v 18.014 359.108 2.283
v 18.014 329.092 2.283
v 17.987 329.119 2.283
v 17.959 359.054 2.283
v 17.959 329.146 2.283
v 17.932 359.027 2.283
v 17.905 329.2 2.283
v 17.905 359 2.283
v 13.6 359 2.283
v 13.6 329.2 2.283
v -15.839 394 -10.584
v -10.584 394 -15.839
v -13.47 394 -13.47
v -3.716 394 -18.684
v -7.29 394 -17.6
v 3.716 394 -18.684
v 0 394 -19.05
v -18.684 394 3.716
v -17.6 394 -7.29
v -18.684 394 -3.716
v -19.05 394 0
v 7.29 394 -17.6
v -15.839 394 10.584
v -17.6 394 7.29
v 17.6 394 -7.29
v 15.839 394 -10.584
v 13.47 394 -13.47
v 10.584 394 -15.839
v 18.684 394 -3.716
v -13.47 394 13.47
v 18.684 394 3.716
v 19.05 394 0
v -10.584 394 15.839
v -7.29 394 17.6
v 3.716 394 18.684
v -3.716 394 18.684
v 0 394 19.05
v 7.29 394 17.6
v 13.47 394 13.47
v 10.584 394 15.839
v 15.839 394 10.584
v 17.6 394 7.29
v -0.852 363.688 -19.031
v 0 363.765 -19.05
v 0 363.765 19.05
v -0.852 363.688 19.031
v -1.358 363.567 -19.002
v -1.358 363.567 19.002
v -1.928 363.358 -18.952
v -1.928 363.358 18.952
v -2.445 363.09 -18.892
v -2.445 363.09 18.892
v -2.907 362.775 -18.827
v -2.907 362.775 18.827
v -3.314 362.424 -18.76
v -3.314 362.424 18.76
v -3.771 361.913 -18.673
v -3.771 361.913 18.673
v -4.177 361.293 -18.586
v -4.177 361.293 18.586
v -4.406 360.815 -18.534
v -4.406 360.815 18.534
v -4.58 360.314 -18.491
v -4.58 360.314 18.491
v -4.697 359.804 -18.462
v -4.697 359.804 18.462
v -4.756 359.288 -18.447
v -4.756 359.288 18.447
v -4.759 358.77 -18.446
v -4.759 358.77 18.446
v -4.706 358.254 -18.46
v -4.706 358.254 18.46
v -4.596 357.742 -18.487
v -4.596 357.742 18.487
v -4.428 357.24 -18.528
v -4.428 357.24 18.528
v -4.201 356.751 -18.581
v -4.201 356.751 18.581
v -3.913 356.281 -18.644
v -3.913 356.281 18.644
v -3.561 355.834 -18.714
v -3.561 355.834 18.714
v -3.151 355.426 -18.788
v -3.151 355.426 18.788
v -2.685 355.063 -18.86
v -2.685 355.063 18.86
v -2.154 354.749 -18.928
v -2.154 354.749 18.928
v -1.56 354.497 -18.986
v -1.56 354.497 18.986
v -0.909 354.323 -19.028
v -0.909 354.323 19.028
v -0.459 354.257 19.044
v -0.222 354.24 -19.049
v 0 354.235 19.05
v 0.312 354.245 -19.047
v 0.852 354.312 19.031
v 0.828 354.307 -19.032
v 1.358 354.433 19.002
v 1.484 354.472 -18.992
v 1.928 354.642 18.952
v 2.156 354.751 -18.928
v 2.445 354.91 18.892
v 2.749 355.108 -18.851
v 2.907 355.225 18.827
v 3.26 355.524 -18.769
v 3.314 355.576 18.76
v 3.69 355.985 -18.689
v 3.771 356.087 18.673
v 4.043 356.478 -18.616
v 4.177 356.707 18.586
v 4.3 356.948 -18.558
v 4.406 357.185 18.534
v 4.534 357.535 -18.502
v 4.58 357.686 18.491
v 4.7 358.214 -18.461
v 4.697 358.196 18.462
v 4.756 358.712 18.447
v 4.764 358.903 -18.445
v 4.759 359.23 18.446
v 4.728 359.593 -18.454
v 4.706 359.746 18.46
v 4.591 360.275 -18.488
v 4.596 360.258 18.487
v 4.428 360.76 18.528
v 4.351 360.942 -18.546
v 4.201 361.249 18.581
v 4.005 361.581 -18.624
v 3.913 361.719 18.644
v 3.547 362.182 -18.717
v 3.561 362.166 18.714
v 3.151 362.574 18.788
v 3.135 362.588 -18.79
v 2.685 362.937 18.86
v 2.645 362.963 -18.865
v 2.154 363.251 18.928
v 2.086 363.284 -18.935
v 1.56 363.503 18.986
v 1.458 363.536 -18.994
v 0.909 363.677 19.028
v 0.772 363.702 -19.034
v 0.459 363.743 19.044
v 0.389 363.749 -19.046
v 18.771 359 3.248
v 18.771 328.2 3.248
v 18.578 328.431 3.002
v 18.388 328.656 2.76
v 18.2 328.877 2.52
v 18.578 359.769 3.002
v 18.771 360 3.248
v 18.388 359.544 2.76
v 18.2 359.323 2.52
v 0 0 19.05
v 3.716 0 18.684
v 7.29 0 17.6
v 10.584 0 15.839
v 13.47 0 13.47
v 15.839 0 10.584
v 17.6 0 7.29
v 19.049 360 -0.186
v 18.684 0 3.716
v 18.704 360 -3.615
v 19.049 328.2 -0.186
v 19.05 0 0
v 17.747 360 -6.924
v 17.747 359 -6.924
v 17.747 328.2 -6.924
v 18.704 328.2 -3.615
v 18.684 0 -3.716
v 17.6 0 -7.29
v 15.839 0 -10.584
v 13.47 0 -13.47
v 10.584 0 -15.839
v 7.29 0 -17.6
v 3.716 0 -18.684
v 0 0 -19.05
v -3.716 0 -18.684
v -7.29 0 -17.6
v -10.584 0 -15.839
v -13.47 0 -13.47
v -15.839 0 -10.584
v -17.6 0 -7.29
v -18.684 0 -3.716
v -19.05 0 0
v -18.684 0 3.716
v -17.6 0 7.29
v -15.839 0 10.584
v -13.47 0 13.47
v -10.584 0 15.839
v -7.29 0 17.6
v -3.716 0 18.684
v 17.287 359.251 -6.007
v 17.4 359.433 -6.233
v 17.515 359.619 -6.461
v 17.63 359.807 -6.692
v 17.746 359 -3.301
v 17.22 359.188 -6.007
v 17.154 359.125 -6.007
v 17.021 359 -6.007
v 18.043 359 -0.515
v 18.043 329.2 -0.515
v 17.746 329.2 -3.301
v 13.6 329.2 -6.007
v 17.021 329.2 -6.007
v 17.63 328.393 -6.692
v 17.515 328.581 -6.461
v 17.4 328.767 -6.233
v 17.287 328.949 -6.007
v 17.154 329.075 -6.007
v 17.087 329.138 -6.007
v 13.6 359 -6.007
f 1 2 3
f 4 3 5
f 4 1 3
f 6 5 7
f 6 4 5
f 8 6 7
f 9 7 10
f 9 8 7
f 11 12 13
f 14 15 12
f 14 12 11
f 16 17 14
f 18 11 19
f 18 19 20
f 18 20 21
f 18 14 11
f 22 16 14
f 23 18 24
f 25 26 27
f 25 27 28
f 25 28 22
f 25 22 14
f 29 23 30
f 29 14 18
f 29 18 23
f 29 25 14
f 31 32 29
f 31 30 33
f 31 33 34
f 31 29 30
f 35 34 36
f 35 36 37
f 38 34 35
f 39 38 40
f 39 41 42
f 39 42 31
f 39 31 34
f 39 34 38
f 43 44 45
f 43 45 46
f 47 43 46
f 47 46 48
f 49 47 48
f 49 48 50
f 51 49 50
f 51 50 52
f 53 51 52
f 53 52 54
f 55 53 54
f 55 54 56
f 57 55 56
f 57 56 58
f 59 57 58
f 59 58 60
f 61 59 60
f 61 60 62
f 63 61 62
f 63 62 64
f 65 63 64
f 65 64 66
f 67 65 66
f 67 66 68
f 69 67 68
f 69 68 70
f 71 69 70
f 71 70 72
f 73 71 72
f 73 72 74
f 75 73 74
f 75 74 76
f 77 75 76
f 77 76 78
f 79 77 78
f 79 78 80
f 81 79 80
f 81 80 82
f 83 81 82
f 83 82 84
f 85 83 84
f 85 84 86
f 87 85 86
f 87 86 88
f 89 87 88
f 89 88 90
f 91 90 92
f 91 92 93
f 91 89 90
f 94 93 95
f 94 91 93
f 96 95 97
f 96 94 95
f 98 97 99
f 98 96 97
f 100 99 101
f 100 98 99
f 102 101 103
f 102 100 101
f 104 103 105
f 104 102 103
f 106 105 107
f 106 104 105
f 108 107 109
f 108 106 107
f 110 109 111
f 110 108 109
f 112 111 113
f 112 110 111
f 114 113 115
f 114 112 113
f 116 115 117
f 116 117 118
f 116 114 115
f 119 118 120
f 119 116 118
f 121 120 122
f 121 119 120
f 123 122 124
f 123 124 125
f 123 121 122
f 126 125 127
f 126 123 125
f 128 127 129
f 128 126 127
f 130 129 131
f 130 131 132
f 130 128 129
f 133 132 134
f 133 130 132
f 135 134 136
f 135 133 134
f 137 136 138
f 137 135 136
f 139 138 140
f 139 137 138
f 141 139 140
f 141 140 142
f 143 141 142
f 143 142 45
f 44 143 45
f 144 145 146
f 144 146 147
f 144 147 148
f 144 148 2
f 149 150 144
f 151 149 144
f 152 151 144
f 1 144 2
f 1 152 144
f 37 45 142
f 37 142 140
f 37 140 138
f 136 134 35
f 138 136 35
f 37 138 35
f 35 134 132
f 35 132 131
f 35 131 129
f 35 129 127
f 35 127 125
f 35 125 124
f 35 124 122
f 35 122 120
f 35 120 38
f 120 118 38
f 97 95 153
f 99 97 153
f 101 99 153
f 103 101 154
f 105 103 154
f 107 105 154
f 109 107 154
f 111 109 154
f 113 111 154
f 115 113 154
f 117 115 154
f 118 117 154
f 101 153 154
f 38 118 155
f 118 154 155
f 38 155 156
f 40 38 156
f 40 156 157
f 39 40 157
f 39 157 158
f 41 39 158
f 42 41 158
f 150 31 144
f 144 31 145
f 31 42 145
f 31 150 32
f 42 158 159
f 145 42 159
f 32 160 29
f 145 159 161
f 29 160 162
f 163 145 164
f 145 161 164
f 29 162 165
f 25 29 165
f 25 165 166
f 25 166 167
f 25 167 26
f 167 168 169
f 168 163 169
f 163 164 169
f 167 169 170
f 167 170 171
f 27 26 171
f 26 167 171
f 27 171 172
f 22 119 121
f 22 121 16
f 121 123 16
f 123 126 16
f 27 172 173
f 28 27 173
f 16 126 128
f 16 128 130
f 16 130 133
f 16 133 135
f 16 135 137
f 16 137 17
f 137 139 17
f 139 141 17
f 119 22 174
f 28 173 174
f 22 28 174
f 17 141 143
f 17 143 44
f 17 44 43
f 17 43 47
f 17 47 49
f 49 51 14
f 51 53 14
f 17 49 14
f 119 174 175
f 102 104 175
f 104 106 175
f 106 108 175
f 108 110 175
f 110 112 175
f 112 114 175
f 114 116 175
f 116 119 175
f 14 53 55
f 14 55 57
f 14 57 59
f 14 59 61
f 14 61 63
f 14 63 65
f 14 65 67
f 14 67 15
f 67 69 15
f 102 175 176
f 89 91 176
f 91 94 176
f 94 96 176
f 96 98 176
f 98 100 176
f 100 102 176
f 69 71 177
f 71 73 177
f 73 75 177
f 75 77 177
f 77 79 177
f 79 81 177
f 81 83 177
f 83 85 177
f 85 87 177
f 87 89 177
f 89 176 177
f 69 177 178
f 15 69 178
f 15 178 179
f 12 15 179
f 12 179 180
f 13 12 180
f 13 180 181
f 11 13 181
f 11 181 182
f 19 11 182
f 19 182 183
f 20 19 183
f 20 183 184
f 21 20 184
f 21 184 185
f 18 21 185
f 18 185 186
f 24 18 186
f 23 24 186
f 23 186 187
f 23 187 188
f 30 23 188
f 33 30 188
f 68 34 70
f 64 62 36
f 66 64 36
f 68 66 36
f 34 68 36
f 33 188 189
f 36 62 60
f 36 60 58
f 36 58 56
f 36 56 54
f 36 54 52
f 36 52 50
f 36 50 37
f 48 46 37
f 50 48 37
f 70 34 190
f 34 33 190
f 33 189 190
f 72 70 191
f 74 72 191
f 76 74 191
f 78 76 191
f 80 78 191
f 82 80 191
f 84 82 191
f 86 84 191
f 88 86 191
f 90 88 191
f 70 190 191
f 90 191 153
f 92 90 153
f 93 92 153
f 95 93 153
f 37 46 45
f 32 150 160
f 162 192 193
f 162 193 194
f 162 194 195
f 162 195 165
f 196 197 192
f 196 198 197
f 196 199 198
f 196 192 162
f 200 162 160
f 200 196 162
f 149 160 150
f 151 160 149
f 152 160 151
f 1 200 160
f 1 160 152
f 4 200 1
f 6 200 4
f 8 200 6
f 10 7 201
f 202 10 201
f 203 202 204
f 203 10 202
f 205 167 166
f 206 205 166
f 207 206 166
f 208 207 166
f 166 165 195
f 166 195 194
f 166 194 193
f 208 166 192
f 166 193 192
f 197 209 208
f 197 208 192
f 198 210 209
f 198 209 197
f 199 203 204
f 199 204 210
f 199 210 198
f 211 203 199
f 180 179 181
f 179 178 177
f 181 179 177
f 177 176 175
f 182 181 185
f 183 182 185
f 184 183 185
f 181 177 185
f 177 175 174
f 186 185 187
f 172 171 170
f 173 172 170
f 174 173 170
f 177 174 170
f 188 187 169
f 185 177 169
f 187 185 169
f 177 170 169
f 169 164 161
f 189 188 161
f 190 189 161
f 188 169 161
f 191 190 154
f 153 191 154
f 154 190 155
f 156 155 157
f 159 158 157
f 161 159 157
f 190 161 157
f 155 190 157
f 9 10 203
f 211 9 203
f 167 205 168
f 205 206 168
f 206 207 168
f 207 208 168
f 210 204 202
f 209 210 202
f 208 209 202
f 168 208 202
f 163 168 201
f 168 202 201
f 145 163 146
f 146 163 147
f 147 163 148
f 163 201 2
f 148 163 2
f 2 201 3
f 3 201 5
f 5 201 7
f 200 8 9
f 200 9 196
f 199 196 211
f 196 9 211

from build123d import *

# Parameters (mm, degrees)
CROQUIS1_R                 = 19.05
SALIENTE_EXTRUIR1_DEPTH    = 394
CORTAR_EXTRUIR1_DEPTH      = 395.919998227
CORTAR_EXTRUIR1_DEPTH_BACK = 395.919998227
CROQUIS2_R                 = 4.765
CORTAR_EXTRUIR2_DEPTH      = 397.295991136
CORTAR_EXTRUIR2_DEPTH_BACK = 5.45
CROQUIS4_W                 = 8.29
CROQUIS4_H                 = 29.8
CHAFL_N1_SIZE              = 1
CHAFL_N1_SIZE_2            = 0.898769363
CHAFL_N1_SIZE_3            = 0.790943361


with BuildPart() as part:
    # Croquis1 → Saliente-Extruir1 (new body)
    with BuildSketch(Plane(origin=(0, 0, 0), x_dir=(1, 0, 0), z_dir=(0, 1, 0))):
        with Locations(Location((0, 0, 0), (0, 0, 270))):
            Circle(CROQUIS1_R)
    extrude(amount=SALIENTE_EXTRUIR1_DEPTH)

    # Croquis2 → Cortar-Extruir1 (cut, two sides: drawn at the far end of the back side and taken through both)
    with BuildSketch(Plane.XY.offset(-CORTAR_EXTRUIR1_DEPTH_BACK)):
        with Locations(Location((0, 359, 0), (0, 0, 90.000000003))):
            Circle(CROQUIS2_R)
    extrude(amount=CORTAR_EXTRUIR1_DEPTH + CORTAR_EXTRUIR1_DEPTH_BACK, mode=Mode.SUBTRACT)

    # Croquis4 → Cortar-Extruir2 (cut, two sides: drawn at the far end of the back side and taken through both)
    with BuildSketch(Plane(origin=(19.05, 0, 0), x_dir=(0, 0, -1), z_dir=(1, 0, 0)).offset(-CORTAR_EXTRUIR2_DEPTH_BACK)):
        with Locations((1.862063648, 344.1)):
            Rectangle(CROQUIS4_W, CROQUIS4_H)
    extrude(amount=CORTAR_EXTRUIR2_DEPTH + CORTAR_EXTRUIR2_DEPTH_BACK, mode=Mode.SUBTRACT)

    # Chaflán1
    # the kernel refuses this chamfer: 1, 0.898769363, 0.790943361 mm, written as the material it takes off along each edge
    with BuildSketch(Plane(origin=(0, 329.2, 0), x_dir=(0.8979062520865971, 0, -0.4401867359017083), z_dir=(-0.4401867359017083, 0, -0.8979062520865971))) as chafl_n1_piece_1_section:
        Polygon((19.05, CHAFL_N1_SIZE), (19.05 - CHAFL_N1_SIZE, 0), (19.05, 0), align=None)
    chafl_n1_piece_1 = revolve(axis=Axis((0, 329.2, 0), (0, -1, 0)), revolution_arc=40.733590892, mode=Mode.PRIVATE)
    chafl_n1_piece_1 = split(chafl_n1_piece_1, bisect_by=Plane(origin=(0, 329.2, 2.282936352), z_dir=(0, 0, -1)), keep=Keep.TOP, mode=Mode.PRIVATE)
    chafl_n1_piece_1 = split(chafl_n1_piece_1, bisect_by=Plane(origin=(0, 329.2, -6.007063648), z_dir=(0, 0, 1)), keep=Keep.TOP, mode=Mode.PRIVATE)
    add(chafl_n1_piece_1, mode=Mode.SUBTRACT)
    with BuildSketch(Plane(origin=(0, 359, 0), x_dir=(0.8979062520865971, 0, -0.4401867359017083), z_dir=(-0.4401867359017083, 0, -0.8979062520865971))) as chafl_n1_piece_2_section:
        Polygon((19.05, -CHAFL_N1_SIZE), (19.05 - CHAFL_N1_SIZE, 0), (19.05, 0), align=None)
    chafl_n1_piece_2 = revolve(axis=Axis((0, 359, 0), (0, -1, 0)), revolution_arc=40.733590892, mode=Mode.PRIVATE)
    chafl_n1_piece_2 = split(chafl_n1_piece_2, bisect_by=Plane(origin=(0, 359, 2.282936352), z_dir=(0, 0, -1)), keep=Keep.TOP, mode=Mode.PRIVATE)
    chafl_n1_piece_2 = split(chafl_n1_piece_2, bisect_by=Plane(origin=(0, 359, -6.007063648), z_dir=(0, 0, 1)), keep=Keep.TOP, mode=Mode.PRIVATE)
    add(chafl_n1_piece_2, mode=Mode.SUBTRACT)
    with BuildSketch(Plane(origin=(18.912712698, 359, 2.282936352), x_dir=(-0.1452151757871569, 0, 0.9894000973929127), z_dir=(0, -1, 0))) as chafl_n1_piece_3:
        with BuildLine():
            Line((0.975350899, 0), (CHAFL_N1_SIZE_2 * 0.14521517582, CHAFL_N1_SIZE_2 * 0.989400097614))
            Line((CHAFL_N1_SIZE_2 * 0.14521517582, CHAFL_N1_SIZE_2 * 0.989400097614), (0, 0))
            ThreePointArc((0, 0), (0.501444944, -0.006238234), (0.975350899, 0))
        make_face()
    extrude(amount=29.8, mode=Mode.SUBTRACT)
    with BuildSketch(Plane(origin=(18.078099633, 359, -6.007063648), x_dir=(-0.33952178475198846, 0, -0.9405981914073748), z_dir=(0, -1, 0))) as chafl_n1_piece_4:
        with BuildLine():
            Line((0.975350899, 0), (CHAFL_N1_SIZE_3 * 0.339521784837, -CHAFL_N1_SIZE_3 * 0.940598191643))
            Line((CHAFL_N1_SIZE_3 * 0.339521784837, -CHAFL_N1_SIZE_3 * 0.940598191643), (0, 0))
            ThreePointArc((0, 0), (0.501444944, 0.006238234), (0.975350899, 0))
        make_face()
    extrude(amount=29.8, mode=Mode.SUBTRACT)
    with BuildSketch(Plane(origin=(0, 329.2, 0), x_dir=(0.8979062520865971, 0, -0.4401867359017083), z_dir=(-0.4401867359017083, 0, -0.8979062520865971))) as chafl_n1_piece_5a_section:
        Polygon((19.05, CHAFL_N1_SIZE), (19.05 - CHAFL_N1_SIZE, 0), (19.05, 0), align=None)
    chafl_n1_piece_5a = revolve(axis=Axis((0, 329.2, 0), (0, -1, 0)), revolution_arc=40.733590892, mode=Mode.PRIVATE)
    chafl_n1_piece_5a = split(chafl_n1_piece_5a, bisect_by=Plane(origin=(0, 329.2, -6.007063648), z_dir=(0, 0, -1)), keep=Keep.TOP, mode=Mode.PRIVATE)
    with BuildSketch(Plane(origin=(18.078099633, 359, -6.007063648), x_dir=(-0.33952178475198846, 0, -0.9405981914073748), z_dir=(0, -1, 0))) as chafl_n1_piece_5b_section:
        with BuildLine():
            Line((0.975350899, 0), (CHAFL_N1_SIZE_3 * 0.339521784837, -CHAFL_N1_SIZE_3 * 0.940598191643))
            Line((CHAFL_N1_SIZE_3 * 0.339521784837, -CHAFL_N1_SIZE_3 * 0.940598191643), (0, 0))
            ThreePointArc((0, 0), (0.501444944, 0.006238234), (0.975350899, 0))
        make_face()
    chafl_n1_piece_5b = extrude(amount=32.308302498, mode=Mode.PRIVATE)
    chafl_n1_piece_5b = split(chafl_n1_piece_5b, bisect_by=Plane(origin=(18.078099633, 329.2, -6.007063648), z_dir=(0, -1, 0)), keep=Keep.TOP, mode=Mode.PRIVATE)
    chafl_n1_piece_5 = chafl_n1_piece_5a & chafl_n1_piece_5b
    add(chafl_n1_piece_5, mode=Mode.SUBTRACT)
    with BuildSketch(Plane(origin=(0, 329.2, 0), x_dir=(0.8979062520865971, 0, -0.4401867359017083), z_dir=(-0.4401867359017083, 0, -0.8979062520865971))) as chafl_n1_piece_6a_section:
        Polygon((19.05, CHAFL_N1_SIZE), (19.05 - CHAFL_N1_SIZE, 0), (19.05, 0), align=None)
    chafl_n1_piece_6a = revolve(axis=Axis((0, 329.2, 0), (0, -1, 0)), revolution_arc=40.733590892, mode=Mode.PRIVATE)
    chafl_n1_piece_6a = split(chafl_n1_piece_6a, bisect_by=Plane(origin=(0, 329.2, 2.282936352), z_dir=(0, 0, 1)), keep=Keep.TOP, mode=Mode.PRIVATE)
    with BuildSketch(Plane(origin=(18.912712698, 359, 2.282936352), x_dir=(-0.1452151757871569, 0, 0.9894000973929127), z_dir=(0, -1, 0))) as chafl_n1_piece_6b_section:
        with BuildLine():
            Line((0.975350899, 0), (CHAFL_N1_SIZE_2 * 0.14521517582, CHAFL_N1_SIZE_2 * 0.989400097614))
            Line((CHAFL_N1_SIZE_2 * 0.14521517582, CHAFL_N1_SIZE_2 * 0.989400097614), (0, 0))
            ThreePointArc((0, 0), (0.501444944, -0.006238234), (0.975350899, 0))
        make_face()
    chafl_n1_piece_6b = extrude(amount=32.308302498, mode=Mode.PRIVATE)
    chafl_n1_piece_6b = split(chafl_n1_piece_6b, bisect_by=Plane(origin=(18.912712698, 329.2, 2.282936352), z_dir=(0, -1, 0)), keep=Keep.TOP, mode=Mode.PRIVATE)
    chafl_n1_piece_6 = chafl_n1_piece_6a & chafl_n1_piece_6b
    add(chafl_n1_piece_6, mode=Mode.SUBTRACT)
    with BuildSketch(Plane(origin=(0, 359, 0), x_dir=(0.8979062520865971, 0, -0.4401867359017083), z_dir=(-0.4401867359017083, 0, -0.8979062520865971))) as chafl_n1_piece_7a_section:
        Polygon((19.05, -CHAFL_N1_SIZE), (19.05 - CHAFL_N1_SIZE, 0), (19.05, 0), align=None)
    chafl_n1_piece_7a = revolve(axis=Axis((0, 359, 0), (0, -1, 0)), revolution_arc=40.733590892, mode=Mode.PRIVATE)
    chafl_n1_piece_7a = split(chafl_n1_piece_7a, bisect_by=Plane(origin=(0, 359, -6.007063648), z_dir=(0, 0, -1)), keep=Keep.TOP, mode=Mode.PRIVATE)
    with BuildSketch(Plane(origin=(18.078099633, 361.508302498, -6.007063648), x_dir=(-0.33952178475198846, 0, -0.9405981914073748), z_dir=(0, -1, 0))) as chafl_n1_piece_7b_section:
        with BuildLine():
            Line((0.975350899, 0), (CHAFL_N1_SIZE_3 * 0.339521784837, -CHAFL_N1_SIZE_3 * 0.940598191643))
            Line((CHAFL_N1_SIZE_3 * 0.339521784837, -CHAFL_N1_SIZE_3 * 0.940598191643), (0, 0))
            ThreePointArc((0, 0), (0.501444944, 0.006238234), (0.975350899, 0))
        make_face()
    chafl_n1_piece_7b = extrude(amount=32.308302498, mode=Mode.PRIVATE)
    chafl_n1_piece_7b = split(chafl_n1_piece_7b, bisect_by=Plane(origin=(18.078099633, 359, -6.007063648), z_dir=(0, 1, 0)), keep=Keep.TOP, mode=Mode.PRIVATE)
    chafl_n1_piece_7 = chafl_n1_piece_7a & chafl_n1_piece_7b
    add(chafl_n1_piece_7, mode=Mode.SUBTRACT)
    with BuildSketch(Plane(origin=(18.912712698, 361.508302498, 2.282936352), x_dir=(-0.1452151757871569, 0, 0.9894000973929127), z_dir=(0, -1, 0))) as chafl_n1_piece_8a_section:
        with BuildLine():
            Line((0.975350899, 0), (CHAFL_N1_SIZE_2 * 0.14521517582, CHAFL_N1_SIZE_2 * 0.989400097614))
            Line((CHAFL_N1_SIZE_2 * 0.14521517582, CHAFL_N1_SIZE_2 * 0.989400097614), (0, 0))
            ThreePointArc((0, 0), (0.501444944, -0.006238234), (0.975350899, 0))
        make_face()
    chafl_n1_piece_8a = extrude(amount=32.308302498, mode=Mode.PRIVATE)
    chafl_n1_piece_8a = split(chafl_n1_piece_8a, bisect_by=Plane(origin=(18.912712698, 359, 2.282936352), z_dir=(0, 1, 0)), keep=Keep.TOP, mode=Mode.PRIVATE)
    with BuildSketch(Plane(origin=(0, 359, 0), x_dir=(0.8979062520865971, 0, -0.4401867359017083), z_dir=(-0.4401867359017083, 0, -0.8979062520865971))) as chafl_n1_piece_8b_section:
        Polygon((19.05, -CHAFL_N1_SIZE), (19.05 - CHAFL_N1_SIZE, 0), (19.05, 0), align=None)
    chafl_n1_piece_8b = revolve(axis=Axis((0, 359, 0), (0, -1, 0)), revolution_arc=40.733590892, mode=Mode.PRIVATE)
    chafl_n1_piece_8b = split(chafl_n1_piece_8b, bisect_by=Plane(origin=(0, 359, 2.282936352), z_dir=(0, 0, 1)), keep=Keep.TOP, mode=Mode.PRIVATE)
    chafl_n1_piece_8 = chafl_n1_piece_8a & chafl_n1_piece_8b
    add(chafl_n1_piece_8, mode=Mode.SUBTRACT)


solid = part.part
